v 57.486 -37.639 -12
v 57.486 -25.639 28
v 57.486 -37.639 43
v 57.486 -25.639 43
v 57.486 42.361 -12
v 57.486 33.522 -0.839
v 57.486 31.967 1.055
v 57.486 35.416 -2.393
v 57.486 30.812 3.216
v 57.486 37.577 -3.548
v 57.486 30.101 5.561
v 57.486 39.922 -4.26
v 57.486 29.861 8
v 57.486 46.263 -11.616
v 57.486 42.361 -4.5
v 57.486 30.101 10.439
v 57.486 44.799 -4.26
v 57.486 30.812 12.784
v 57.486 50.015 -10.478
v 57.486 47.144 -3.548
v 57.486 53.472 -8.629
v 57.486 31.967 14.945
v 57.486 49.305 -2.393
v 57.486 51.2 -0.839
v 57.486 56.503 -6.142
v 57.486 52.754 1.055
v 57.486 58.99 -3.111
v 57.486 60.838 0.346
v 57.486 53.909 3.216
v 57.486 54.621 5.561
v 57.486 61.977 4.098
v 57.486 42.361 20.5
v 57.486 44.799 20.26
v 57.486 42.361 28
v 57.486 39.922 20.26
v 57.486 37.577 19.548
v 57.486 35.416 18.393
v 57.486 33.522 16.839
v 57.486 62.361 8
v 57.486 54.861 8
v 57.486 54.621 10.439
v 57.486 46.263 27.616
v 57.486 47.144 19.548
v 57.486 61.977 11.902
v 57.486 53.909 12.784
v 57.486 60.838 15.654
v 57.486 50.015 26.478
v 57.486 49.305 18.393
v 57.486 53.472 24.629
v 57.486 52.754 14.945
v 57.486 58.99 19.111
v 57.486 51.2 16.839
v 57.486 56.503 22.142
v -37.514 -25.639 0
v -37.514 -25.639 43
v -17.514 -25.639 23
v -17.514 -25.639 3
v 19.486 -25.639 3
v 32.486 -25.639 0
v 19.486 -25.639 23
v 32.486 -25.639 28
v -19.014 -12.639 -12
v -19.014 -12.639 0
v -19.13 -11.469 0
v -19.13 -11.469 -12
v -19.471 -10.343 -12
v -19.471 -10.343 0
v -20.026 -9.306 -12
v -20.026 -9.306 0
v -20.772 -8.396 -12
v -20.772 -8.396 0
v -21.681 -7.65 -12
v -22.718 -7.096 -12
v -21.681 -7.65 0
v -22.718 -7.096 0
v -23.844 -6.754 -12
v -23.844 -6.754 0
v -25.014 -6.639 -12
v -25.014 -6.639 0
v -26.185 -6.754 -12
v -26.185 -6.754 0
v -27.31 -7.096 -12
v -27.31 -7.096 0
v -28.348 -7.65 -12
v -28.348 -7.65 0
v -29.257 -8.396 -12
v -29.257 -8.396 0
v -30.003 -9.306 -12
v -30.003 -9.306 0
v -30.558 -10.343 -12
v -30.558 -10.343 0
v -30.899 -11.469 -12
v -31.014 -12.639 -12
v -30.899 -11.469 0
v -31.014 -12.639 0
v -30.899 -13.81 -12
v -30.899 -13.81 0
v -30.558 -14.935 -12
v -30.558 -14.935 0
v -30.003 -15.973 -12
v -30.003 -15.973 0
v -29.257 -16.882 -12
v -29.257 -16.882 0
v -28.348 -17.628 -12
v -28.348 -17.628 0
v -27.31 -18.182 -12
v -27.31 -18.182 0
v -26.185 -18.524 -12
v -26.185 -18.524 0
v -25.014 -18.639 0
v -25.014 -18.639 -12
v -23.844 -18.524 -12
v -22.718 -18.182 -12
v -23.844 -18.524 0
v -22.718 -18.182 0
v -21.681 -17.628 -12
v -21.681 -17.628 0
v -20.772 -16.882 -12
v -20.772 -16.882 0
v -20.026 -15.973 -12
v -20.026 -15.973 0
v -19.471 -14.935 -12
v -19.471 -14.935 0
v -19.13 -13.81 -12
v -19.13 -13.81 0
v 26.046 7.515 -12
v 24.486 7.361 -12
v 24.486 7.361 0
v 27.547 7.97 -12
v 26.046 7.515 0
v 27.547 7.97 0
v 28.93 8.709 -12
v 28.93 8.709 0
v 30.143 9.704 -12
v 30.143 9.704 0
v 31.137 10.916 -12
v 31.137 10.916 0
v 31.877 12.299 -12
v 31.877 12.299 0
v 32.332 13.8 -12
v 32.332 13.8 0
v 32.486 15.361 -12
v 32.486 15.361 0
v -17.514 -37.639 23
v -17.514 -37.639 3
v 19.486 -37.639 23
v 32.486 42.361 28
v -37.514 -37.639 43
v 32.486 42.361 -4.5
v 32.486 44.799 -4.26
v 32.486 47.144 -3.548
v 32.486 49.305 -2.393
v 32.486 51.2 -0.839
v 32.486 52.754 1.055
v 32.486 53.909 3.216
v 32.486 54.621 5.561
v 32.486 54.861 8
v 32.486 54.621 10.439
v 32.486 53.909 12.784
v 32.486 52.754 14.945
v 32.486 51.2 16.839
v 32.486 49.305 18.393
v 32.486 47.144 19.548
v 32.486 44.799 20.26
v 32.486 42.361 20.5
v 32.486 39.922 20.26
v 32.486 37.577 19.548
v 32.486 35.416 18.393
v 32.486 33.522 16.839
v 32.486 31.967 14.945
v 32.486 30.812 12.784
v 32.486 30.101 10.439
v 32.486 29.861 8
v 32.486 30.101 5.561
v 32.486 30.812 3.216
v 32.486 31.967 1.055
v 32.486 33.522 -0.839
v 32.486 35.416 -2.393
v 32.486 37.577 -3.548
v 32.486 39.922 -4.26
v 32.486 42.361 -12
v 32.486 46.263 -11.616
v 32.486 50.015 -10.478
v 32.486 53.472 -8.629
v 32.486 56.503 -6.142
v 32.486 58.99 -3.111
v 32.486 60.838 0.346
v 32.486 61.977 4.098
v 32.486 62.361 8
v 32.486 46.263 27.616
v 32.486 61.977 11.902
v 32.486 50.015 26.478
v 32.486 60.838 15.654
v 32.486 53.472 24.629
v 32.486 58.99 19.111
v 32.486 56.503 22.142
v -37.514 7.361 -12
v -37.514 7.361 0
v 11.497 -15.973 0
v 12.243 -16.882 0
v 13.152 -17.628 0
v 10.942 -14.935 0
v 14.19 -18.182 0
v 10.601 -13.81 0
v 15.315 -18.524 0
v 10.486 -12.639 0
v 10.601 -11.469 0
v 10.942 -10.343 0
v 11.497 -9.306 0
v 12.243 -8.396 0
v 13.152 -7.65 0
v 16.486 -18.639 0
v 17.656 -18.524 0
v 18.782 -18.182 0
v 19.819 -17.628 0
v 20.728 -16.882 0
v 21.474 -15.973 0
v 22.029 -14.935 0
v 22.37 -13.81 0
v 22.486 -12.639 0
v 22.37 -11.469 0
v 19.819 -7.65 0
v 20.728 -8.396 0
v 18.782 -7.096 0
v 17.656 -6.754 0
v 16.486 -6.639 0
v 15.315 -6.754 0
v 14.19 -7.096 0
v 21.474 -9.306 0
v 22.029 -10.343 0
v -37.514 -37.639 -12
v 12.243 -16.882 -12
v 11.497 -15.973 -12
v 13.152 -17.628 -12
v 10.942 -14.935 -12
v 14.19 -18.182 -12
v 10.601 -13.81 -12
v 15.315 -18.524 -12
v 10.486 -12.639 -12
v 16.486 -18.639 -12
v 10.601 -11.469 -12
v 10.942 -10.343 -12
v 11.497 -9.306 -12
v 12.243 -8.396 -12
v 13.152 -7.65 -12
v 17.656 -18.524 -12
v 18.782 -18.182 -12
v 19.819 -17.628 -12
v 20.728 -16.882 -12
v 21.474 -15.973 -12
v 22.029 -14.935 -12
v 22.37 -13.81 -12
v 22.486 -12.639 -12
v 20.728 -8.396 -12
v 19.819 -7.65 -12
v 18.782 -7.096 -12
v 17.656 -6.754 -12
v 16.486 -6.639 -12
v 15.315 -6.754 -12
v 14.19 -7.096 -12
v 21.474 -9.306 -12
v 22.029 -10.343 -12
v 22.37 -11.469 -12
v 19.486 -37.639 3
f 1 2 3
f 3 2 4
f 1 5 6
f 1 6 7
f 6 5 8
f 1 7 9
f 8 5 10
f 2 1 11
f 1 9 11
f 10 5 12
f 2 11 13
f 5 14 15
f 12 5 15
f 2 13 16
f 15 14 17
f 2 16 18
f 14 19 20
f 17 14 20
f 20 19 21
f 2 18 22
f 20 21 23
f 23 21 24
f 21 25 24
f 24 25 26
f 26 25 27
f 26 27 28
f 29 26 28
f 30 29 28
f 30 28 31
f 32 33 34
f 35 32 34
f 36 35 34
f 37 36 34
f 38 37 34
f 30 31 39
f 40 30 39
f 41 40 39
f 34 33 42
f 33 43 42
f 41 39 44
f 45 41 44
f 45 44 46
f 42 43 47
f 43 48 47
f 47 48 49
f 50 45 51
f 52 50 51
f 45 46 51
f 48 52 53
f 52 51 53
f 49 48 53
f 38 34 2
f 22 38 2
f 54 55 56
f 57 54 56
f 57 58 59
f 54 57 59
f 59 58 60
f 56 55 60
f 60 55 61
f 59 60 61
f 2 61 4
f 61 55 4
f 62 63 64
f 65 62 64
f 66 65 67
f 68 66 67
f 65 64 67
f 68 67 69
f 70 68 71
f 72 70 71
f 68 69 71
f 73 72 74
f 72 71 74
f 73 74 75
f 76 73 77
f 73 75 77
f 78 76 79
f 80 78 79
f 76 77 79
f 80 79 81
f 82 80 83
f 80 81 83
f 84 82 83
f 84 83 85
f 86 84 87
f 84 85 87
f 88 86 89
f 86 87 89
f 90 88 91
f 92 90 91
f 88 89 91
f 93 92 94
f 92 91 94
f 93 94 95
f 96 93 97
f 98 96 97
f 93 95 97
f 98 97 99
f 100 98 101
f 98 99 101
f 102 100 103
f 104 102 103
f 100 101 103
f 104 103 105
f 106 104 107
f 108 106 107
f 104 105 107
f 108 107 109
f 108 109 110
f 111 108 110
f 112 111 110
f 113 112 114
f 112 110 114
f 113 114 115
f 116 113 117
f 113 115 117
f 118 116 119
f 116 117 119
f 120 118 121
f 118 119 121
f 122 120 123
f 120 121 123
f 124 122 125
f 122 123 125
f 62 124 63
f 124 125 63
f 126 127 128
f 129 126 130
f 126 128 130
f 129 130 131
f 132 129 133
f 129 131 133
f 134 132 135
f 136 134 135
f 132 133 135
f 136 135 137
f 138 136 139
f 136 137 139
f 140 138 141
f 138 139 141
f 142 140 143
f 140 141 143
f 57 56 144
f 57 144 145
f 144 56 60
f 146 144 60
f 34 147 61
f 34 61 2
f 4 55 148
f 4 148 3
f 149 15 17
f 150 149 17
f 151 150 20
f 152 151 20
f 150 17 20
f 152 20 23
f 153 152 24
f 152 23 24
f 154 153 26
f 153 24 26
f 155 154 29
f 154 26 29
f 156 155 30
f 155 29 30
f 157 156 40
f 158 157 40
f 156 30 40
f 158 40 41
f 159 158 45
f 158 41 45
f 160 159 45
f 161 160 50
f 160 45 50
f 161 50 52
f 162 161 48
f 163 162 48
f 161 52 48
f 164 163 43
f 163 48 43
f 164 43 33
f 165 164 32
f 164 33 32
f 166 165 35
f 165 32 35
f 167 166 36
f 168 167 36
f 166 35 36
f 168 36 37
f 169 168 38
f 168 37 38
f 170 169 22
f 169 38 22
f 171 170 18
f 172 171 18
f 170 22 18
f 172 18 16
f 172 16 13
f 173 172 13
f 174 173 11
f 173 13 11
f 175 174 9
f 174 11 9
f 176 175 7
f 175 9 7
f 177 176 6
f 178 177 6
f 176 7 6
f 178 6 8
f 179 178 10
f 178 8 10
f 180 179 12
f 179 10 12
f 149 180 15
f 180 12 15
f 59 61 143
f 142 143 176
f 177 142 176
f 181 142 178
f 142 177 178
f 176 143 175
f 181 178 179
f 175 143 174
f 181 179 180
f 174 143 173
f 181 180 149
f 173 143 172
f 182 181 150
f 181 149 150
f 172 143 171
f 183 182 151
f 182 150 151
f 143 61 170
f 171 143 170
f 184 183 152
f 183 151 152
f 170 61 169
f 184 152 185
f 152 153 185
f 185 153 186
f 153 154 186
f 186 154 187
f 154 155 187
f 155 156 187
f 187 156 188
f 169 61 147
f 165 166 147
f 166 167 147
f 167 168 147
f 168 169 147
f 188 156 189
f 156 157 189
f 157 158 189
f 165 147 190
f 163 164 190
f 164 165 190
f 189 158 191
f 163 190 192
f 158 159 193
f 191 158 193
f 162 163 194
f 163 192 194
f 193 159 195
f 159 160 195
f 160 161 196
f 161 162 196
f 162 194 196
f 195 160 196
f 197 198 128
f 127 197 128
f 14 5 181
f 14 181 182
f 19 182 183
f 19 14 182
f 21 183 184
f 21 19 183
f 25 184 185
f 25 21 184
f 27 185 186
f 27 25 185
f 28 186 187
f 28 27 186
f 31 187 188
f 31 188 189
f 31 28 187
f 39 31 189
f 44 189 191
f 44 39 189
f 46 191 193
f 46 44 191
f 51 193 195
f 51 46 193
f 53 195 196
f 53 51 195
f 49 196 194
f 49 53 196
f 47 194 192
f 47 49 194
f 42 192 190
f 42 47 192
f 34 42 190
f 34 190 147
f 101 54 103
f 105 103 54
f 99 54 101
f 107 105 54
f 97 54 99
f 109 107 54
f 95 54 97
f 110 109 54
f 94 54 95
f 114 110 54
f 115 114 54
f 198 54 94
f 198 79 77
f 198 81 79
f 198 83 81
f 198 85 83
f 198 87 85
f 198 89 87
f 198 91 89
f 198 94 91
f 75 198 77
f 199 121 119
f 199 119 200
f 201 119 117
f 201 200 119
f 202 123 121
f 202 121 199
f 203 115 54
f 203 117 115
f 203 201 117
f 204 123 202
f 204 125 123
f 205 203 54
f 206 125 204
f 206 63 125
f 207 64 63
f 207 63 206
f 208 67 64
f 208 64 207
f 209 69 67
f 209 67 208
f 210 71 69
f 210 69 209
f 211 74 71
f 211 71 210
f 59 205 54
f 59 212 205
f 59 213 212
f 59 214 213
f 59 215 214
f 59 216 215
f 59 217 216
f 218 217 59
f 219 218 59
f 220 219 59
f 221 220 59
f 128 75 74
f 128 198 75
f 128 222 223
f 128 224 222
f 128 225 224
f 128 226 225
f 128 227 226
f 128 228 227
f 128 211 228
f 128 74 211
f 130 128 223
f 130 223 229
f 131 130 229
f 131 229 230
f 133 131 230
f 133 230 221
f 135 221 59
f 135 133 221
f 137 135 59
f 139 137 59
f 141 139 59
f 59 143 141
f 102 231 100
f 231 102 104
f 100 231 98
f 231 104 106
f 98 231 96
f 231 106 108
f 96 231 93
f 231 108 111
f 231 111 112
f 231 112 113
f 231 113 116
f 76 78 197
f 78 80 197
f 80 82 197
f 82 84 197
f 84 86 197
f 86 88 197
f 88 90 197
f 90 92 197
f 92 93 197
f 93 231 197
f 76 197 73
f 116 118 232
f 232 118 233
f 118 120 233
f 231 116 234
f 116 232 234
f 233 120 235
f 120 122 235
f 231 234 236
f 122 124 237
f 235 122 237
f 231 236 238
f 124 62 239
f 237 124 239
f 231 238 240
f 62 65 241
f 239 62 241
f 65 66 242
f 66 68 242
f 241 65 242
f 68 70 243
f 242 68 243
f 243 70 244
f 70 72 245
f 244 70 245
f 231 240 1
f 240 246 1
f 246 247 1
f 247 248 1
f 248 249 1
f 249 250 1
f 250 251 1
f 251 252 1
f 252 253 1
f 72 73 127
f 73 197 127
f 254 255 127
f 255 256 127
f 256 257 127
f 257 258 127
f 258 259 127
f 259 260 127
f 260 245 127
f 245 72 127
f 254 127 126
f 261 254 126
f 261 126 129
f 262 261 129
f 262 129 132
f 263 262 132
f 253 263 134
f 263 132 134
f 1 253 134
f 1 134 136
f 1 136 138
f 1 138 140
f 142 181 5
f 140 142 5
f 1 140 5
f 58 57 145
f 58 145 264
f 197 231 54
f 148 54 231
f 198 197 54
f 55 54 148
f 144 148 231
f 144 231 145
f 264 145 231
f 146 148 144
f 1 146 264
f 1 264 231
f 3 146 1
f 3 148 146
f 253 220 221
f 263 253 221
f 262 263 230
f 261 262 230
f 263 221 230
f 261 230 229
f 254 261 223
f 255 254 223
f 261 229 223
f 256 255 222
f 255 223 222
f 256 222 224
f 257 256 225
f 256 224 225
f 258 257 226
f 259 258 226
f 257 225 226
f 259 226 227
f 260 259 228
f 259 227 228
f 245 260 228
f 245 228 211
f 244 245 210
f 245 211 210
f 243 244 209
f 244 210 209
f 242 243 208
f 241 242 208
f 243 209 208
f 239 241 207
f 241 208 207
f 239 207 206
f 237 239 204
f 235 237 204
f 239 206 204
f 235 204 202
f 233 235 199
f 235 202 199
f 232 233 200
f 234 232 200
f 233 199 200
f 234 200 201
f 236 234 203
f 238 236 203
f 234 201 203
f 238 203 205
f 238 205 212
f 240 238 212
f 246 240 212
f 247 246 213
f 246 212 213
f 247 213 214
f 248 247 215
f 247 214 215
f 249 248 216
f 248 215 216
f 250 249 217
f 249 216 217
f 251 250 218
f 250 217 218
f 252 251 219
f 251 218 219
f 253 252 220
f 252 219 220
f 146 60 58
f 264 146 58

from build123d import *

# Parameters (mm, degrees)
SKETCH1_W                = 95
SKETCH1_H                = 33
BOSS_EXTRUDE1_DEPTH      = 12
SKETCH2_R                = 6
CUT_EXTRUDE1_DEPTH       = 12
SKETCH3_W                = 25
SKETCH3_H                = 68
BOSS_EXTRUDE2_DEPTH      = 28
BOSS_EXTRUDE2_DEPTH_BACK = 12
SKETCH4_R                = 20
BOSS_EXTRUDE3_DEPTH      = 25
SKETCH5_R                = 12.5
CUT_EXTRUDE2_DEPTH       = 25
SKETCH6_W                = 95
SKETCH6_H                = 55
BOSS_EXTRUDE4_DEPTH      = 12
SKETCH7_W                = 37
SKETCH7_H                = 20
CUT_EXTRUDE3_DEPTH       = 12
FILLET1_R                = 8


with BuildPart() as part:
    # Sketch1 → Boss-Extrude1 (new body)
    with BuildSketch(Plane.XY):
        with Locations((9.985654596, -9.139131357)):
            Rectangle(SKETCH1_W, SKETCH1_H)
    extrude(amount=-BOSS_EXTRUDE1_DEPTH)

    # Sketch2 → Cut-Extrude1 (cut)
    with BuildSketch(Plane.XY):
        with Locations((-25.014345404, -12.639131357)):
            Circle(SKETCH2_R)
        with Locations((16.485654596, -12.639131357)):
            Circle(SKETCH2_R)
    extrude(amount=-CUT_EXTRUDE1_DEPTH, mode=Mode.SUBTRACT)

    # Sketch3 → Boss-Extrude2 (add, two sides)
    with BuildSketch(Plane.XY) as boss_extrude2_sk:
        with Locations((44.985654596, 8.360868643)):
            Rectangle(SKETCH3_W, SKETCH3_H)
    extrude(amount=BOSS_EXTRUDE2_DEPTH)
    extrude(boss_extrude2_sk.sketch, amount=-BOSS_EXTRUDE2_DEPTH_BACK)

    # Sketch4 → Boss-Extrude3 (add)
    with BuildSketch(Plane(origin=(57.485654596, 0, 0), x_dir=(0, 0, -1), z_dir=(1, 0, 0))):
        with Locations((-8, 42.360868643)):
            Circle(SKETCH4_R)
    extrude(amount=-BOSS_EXTRUDE3_DEPTH)

    # Sketch5 → Cut-Extrude2 (cut)
    with BuildSketch(Plane(origin=(57.485654596, 0, 0), x_dir=(0, 0, -1), z_dir=(1, 0, 0))):
        with Locations((-8, 42.360868643)):
            Circle(SKETCH5_R)
    extrude(amount=-CUT_EXTRUDE2_DEPTH, mode=Mode.SUBTRACT)

    # Sketch6 → Boss-Extrude4 (add)
    with BuildSketch(Plane.XZ.offset(25.639131357)):
        with Locations((9.985654596, 15.5)):
            Rectangle(SKETCH6_W, SKETCH6_H)
    extrude(amount=BOSS_EXTRUDE4_DEPTH)

    # Sketch7 → Cut-Extrude3 (cut)
    with BuildSketch(Plane(origin=(0, -25.639131357, 0), x_dir=(1, 0, 0), z_dir=(0, 1, 0))):
        with Locations((0.985654596, -13)):
            Rectangle(SKETCH7_W, SKETCH7_H)
    extrude(amount=-CUT_EXTRUDE3_DEPTH, mode=Mode.SUBTRACT)

    # Fillet1
    fillet1_edges = [part.edges().sort_by_distance(p)[0] for p in [
        (32.485654596, 7.360868643, -6),
    ]]
    fillet(fillet1_edges, radius=FILLET1_R)


solid = part.part
